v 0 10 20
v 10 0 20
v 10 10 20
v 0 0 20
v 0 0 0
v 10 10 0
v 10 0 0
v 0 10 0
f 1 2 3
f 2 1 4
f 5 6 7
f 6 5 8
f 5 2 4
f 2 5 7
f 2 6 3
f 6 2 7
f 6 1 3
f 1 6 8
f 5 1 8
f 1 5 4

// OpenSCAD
/* [Basic Settings] */

// Width of the object
Width = 10;

// Material type
Material = "PLA"; // [PLA, PETG, ABS]

/* [Advanced] */

// Resolution
Resolution = 32; // [8:Low, 16:Medium, 32:High, 64:Ultra]

/* [Hidden] */
internal_size = Width * 2;

module customizerBox() {
  cube([Width, Width, internal_size]);
}

customizerBox();
